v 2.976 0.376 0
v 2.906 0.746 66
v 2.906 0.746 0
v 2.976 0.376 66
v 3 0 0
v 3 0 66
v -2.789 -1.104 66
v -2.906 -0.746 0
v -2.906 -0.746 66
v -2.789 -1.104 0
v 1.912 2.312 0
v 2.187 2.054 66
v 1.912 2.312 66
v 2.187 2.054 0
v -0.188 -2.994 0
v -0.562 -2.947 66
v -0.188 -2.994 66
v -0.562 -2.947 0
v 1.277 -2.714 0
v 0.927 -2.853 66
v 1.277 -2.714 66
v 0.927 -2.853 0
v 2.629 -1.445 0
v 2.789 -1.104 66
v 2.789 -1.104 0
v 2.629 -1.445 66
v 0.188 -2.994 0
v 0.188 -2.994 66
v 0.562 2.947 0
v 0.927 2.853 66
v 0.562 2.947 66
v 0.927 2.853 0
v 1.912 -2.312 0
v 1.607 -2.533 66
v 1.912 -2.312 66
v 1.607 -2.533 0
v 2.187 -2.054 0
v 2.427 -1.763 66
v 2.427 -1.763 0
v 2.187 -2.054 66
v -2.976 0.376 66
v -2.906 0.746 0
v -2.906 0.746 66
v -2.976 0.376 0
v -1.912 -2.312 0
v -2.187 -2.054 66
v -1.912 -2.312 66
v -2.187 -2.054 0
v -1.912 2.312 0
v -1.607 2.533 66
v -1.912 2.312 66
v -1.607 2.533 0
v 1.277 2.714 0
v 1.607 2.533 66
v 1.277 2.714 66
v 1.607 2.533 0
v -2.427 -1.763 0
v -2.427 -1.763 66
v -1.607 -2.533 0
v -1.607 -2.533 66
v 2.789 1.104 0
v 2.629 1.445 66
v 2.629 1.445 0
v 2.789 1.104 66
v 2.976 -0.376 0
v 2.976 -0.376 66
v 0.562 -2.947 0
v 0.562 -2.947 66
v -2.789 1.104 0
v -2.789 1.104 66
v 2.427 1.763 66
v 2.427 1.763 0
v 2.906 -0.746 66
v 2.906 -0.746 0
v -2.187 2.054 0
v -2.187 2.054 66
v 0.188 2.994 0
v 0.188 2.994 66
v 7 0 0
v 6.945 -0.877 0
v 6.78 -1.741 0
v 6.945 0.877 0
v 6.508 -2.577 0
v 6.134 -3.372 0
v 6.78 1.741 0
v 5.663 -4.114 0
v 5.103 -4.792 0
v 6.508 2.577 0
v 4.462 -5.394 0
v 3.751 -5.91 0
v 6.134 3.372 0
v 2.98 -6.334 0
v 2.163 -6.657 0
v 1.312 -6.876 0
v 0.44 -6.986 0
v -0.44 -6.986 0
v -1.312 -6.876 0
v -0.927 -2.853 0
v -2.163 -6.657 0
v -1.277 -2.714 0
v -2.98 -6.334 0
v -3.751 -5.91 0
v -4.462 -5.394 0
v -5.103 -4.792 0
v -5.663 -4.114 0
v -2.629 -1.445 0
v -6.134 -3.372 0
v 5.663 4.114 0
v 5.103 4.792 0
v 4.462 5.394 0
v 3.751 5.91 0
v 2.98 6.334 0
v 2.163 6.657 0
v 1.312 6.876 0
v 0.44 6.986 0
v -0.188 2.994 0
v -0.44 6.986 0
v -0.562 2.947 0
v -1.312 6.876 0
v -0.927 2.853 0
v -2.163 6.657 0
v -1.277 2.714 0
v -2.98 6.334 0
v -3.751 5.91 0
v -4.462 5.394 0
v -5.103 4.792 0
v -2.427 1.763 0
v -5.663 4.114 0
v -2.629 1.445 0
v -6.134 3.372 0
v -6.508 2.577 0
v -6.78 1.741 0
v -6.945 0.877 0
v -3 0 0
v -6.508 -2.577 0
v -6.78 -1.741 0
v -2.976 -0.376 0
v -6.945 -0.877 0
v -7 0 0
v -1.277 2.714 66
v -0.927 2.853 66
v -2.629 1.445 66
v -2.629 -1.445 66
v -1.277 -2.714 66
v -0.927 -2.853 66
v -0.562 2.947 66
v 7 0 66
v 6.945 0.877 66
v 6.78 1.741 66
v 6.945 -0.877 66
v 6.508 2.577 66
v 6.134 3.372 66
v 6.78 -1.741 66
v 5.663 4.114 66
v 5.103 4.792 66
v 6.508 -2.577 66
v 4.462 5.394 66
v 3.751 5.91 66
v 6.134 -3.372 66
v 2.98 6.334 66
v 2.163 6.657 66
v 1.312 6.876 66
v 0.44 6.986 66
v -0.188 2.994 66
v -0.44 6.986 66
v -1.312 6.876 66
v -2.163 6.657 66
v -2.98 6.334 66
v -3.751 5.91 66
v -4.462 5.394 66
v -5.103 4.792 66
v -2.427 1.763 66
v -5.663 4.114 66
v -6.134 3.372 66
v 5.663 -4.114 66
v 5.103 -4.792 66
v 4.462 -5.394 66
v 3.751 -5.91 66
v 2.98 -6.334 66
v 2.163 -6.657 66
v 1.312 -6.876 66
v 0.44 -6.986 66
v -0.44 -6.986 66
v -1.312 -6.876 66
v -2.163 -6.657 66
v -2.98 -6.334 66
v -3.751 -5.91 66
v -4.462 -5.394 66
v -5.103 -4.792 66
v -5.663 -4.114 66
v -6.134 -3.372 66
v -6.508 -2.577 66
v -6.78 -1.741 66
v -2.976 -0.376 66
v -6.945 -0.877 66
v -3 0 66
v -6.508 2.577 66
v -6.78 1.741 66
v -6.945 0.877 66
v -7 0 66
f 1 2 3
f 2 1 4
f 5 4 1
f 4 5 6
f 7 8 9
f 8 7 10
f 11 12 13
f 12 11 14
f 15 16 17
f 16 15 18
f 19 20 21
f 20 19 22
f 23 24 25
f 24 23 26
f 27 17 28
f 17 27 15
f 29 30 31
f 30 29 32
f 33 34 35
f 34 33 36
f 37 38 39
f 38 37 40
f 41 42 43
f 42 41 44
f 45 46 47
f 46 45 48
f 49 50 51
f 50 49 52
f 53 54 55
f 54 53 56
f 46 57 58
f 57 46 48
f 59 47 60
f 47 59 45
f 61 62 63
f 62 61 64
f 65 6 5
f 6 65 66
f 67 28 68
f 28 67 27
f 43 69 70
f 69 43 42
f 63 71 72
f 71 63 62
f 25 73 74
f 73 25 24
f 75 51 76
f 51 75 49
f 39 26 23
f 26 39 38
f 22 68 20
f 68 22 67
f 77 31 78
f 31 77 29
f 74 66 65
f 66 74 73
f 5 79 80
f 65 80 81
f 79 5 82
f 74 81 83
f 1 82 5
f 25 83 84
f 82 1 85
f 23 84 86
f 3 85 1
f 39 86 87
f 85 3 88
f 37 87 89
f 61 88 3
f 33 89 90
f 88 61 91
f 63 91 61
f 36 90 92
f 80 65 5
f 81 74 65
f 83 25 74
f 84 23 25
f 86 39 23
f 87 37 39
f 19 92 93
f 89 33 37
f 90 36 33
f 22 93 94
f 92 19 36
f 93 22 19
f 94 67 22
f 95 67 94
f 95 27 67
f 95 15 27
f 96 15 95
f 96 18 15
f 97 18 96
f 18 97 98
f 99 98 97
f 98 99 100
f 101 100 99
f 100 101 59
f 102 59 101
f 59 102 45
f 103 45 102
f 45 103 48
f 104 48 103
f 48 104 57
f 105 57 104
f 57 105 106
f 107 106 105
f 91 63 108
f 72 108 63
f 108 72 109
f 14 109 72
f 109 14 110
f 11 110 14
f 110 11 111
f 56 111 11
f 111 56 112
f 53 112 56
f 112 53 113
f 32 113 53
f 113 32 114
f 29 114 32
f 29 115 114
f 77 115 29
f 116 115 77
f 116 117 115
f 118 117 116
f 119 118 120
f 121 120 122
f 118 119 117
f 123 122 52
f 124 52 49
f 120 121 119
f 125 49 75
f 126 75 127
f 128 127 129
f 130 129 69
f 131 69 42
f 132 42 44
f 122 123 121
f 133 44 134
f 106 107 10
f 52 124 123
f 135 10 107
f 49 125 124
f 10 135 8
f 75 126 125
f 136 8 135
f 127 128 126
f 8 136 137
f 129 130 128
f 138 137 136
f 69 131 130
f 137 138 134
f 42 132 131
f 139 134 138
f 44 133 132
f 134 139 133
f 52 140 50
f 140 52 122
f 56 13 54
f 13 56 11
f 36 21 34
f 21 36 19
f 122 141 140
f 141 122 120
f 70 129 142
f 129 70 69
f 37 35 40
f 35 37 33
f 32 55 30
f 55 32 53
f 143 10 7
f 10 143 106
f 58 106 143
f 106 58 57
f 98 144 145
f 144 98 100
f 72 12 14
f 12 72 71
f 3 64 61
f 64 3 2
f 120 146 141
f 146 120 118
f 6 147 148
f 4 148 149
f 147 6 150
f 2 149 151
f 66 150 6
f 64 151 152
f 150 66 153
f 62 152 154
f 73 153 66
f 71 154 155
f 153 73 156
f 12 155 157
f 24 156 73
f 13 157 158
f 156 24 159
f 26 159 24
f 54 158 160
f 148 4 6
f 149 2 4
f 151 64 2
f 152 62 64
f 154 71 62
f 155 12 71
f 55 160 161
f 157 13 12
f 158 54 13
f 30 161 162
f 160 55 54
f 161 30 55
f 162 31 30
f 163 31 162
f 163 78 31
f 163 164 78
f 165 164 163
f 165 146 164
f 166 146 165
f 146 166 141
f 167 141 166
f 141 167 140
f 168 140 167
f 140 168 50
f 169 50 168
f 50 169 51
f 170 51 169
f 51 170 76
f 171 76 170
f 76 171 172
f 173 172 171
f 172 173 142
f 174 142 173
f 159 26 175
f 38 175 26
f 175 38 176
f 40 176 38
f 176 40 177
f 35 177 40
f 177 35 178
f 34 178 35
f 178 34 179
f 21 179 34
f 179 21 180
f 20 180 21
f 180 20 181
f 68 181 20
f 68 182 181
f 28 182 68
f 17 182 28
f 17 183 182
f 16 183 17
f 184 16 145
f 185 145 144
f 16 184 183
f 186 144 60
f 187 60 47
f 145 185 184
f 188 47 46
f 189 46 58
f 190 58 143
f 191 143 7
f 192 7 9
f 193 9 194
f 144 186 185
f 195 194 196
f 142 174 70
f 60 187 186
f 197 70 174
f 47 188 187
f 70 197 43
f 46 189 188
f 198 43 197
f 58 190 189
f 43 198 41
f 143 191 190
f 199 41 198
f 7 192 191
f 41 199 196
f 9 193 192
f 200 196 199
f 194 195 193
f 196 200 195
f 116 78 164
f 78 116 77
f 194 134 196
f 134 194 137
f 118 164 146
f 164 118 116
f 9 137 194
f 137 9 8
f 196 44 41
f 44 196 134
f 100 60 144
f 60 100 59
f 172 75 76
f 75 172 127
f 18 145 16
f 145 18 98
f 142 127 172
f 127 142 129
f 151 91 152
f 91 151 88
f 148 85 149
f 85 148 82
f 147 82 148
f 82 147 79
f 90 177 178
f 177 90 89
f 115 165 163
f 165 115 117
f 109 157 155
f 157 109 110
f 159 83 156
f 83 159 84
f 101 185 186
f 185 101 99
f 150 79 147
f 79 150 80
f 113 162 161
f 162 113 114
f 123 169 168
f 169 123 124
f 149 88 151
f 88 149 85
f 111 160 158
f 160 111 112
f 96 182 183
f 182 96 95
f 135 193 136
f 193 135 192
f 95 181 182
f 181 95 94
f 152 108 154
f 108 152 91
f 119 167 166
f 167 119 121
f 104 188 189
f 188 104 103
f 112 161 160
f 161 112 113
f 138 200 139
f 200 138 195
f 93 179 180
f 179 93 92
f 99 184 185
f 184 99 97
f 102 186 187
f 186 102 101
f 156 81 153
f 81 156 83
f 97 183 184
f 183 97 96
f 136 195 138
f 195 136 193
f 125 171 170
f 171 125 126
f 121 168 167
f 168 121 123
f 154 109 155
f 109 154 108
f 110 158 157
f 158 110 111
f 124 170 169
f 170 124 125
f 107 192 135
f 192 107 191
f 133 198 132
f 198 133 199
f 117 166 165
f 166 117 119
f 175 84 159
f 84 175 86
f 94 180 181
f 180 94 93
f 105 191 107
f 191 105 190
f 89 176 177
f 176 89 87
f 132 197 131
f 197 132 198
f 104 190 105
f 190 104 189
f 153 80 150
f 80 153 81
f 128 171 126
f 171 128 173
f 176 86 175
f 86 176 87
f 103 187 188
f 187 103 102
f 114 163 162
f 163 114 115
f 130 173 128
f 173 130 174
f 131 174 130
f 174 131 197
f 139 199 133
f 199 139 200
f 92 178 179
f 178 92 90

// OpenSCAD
$fn = 50;


difference() {
	union() {
		cylinder(h = 66, r = 7.0000000000);
	}
	union() {
		cylinder(h = 66, r = 3.0000000000);
		cylinder(h = 66, r = 1.5000000000);
		cylinder(h = 66, r = 1.5000000000);
		cylinder(h = 66, r = 1.5000000000);
	}
}
